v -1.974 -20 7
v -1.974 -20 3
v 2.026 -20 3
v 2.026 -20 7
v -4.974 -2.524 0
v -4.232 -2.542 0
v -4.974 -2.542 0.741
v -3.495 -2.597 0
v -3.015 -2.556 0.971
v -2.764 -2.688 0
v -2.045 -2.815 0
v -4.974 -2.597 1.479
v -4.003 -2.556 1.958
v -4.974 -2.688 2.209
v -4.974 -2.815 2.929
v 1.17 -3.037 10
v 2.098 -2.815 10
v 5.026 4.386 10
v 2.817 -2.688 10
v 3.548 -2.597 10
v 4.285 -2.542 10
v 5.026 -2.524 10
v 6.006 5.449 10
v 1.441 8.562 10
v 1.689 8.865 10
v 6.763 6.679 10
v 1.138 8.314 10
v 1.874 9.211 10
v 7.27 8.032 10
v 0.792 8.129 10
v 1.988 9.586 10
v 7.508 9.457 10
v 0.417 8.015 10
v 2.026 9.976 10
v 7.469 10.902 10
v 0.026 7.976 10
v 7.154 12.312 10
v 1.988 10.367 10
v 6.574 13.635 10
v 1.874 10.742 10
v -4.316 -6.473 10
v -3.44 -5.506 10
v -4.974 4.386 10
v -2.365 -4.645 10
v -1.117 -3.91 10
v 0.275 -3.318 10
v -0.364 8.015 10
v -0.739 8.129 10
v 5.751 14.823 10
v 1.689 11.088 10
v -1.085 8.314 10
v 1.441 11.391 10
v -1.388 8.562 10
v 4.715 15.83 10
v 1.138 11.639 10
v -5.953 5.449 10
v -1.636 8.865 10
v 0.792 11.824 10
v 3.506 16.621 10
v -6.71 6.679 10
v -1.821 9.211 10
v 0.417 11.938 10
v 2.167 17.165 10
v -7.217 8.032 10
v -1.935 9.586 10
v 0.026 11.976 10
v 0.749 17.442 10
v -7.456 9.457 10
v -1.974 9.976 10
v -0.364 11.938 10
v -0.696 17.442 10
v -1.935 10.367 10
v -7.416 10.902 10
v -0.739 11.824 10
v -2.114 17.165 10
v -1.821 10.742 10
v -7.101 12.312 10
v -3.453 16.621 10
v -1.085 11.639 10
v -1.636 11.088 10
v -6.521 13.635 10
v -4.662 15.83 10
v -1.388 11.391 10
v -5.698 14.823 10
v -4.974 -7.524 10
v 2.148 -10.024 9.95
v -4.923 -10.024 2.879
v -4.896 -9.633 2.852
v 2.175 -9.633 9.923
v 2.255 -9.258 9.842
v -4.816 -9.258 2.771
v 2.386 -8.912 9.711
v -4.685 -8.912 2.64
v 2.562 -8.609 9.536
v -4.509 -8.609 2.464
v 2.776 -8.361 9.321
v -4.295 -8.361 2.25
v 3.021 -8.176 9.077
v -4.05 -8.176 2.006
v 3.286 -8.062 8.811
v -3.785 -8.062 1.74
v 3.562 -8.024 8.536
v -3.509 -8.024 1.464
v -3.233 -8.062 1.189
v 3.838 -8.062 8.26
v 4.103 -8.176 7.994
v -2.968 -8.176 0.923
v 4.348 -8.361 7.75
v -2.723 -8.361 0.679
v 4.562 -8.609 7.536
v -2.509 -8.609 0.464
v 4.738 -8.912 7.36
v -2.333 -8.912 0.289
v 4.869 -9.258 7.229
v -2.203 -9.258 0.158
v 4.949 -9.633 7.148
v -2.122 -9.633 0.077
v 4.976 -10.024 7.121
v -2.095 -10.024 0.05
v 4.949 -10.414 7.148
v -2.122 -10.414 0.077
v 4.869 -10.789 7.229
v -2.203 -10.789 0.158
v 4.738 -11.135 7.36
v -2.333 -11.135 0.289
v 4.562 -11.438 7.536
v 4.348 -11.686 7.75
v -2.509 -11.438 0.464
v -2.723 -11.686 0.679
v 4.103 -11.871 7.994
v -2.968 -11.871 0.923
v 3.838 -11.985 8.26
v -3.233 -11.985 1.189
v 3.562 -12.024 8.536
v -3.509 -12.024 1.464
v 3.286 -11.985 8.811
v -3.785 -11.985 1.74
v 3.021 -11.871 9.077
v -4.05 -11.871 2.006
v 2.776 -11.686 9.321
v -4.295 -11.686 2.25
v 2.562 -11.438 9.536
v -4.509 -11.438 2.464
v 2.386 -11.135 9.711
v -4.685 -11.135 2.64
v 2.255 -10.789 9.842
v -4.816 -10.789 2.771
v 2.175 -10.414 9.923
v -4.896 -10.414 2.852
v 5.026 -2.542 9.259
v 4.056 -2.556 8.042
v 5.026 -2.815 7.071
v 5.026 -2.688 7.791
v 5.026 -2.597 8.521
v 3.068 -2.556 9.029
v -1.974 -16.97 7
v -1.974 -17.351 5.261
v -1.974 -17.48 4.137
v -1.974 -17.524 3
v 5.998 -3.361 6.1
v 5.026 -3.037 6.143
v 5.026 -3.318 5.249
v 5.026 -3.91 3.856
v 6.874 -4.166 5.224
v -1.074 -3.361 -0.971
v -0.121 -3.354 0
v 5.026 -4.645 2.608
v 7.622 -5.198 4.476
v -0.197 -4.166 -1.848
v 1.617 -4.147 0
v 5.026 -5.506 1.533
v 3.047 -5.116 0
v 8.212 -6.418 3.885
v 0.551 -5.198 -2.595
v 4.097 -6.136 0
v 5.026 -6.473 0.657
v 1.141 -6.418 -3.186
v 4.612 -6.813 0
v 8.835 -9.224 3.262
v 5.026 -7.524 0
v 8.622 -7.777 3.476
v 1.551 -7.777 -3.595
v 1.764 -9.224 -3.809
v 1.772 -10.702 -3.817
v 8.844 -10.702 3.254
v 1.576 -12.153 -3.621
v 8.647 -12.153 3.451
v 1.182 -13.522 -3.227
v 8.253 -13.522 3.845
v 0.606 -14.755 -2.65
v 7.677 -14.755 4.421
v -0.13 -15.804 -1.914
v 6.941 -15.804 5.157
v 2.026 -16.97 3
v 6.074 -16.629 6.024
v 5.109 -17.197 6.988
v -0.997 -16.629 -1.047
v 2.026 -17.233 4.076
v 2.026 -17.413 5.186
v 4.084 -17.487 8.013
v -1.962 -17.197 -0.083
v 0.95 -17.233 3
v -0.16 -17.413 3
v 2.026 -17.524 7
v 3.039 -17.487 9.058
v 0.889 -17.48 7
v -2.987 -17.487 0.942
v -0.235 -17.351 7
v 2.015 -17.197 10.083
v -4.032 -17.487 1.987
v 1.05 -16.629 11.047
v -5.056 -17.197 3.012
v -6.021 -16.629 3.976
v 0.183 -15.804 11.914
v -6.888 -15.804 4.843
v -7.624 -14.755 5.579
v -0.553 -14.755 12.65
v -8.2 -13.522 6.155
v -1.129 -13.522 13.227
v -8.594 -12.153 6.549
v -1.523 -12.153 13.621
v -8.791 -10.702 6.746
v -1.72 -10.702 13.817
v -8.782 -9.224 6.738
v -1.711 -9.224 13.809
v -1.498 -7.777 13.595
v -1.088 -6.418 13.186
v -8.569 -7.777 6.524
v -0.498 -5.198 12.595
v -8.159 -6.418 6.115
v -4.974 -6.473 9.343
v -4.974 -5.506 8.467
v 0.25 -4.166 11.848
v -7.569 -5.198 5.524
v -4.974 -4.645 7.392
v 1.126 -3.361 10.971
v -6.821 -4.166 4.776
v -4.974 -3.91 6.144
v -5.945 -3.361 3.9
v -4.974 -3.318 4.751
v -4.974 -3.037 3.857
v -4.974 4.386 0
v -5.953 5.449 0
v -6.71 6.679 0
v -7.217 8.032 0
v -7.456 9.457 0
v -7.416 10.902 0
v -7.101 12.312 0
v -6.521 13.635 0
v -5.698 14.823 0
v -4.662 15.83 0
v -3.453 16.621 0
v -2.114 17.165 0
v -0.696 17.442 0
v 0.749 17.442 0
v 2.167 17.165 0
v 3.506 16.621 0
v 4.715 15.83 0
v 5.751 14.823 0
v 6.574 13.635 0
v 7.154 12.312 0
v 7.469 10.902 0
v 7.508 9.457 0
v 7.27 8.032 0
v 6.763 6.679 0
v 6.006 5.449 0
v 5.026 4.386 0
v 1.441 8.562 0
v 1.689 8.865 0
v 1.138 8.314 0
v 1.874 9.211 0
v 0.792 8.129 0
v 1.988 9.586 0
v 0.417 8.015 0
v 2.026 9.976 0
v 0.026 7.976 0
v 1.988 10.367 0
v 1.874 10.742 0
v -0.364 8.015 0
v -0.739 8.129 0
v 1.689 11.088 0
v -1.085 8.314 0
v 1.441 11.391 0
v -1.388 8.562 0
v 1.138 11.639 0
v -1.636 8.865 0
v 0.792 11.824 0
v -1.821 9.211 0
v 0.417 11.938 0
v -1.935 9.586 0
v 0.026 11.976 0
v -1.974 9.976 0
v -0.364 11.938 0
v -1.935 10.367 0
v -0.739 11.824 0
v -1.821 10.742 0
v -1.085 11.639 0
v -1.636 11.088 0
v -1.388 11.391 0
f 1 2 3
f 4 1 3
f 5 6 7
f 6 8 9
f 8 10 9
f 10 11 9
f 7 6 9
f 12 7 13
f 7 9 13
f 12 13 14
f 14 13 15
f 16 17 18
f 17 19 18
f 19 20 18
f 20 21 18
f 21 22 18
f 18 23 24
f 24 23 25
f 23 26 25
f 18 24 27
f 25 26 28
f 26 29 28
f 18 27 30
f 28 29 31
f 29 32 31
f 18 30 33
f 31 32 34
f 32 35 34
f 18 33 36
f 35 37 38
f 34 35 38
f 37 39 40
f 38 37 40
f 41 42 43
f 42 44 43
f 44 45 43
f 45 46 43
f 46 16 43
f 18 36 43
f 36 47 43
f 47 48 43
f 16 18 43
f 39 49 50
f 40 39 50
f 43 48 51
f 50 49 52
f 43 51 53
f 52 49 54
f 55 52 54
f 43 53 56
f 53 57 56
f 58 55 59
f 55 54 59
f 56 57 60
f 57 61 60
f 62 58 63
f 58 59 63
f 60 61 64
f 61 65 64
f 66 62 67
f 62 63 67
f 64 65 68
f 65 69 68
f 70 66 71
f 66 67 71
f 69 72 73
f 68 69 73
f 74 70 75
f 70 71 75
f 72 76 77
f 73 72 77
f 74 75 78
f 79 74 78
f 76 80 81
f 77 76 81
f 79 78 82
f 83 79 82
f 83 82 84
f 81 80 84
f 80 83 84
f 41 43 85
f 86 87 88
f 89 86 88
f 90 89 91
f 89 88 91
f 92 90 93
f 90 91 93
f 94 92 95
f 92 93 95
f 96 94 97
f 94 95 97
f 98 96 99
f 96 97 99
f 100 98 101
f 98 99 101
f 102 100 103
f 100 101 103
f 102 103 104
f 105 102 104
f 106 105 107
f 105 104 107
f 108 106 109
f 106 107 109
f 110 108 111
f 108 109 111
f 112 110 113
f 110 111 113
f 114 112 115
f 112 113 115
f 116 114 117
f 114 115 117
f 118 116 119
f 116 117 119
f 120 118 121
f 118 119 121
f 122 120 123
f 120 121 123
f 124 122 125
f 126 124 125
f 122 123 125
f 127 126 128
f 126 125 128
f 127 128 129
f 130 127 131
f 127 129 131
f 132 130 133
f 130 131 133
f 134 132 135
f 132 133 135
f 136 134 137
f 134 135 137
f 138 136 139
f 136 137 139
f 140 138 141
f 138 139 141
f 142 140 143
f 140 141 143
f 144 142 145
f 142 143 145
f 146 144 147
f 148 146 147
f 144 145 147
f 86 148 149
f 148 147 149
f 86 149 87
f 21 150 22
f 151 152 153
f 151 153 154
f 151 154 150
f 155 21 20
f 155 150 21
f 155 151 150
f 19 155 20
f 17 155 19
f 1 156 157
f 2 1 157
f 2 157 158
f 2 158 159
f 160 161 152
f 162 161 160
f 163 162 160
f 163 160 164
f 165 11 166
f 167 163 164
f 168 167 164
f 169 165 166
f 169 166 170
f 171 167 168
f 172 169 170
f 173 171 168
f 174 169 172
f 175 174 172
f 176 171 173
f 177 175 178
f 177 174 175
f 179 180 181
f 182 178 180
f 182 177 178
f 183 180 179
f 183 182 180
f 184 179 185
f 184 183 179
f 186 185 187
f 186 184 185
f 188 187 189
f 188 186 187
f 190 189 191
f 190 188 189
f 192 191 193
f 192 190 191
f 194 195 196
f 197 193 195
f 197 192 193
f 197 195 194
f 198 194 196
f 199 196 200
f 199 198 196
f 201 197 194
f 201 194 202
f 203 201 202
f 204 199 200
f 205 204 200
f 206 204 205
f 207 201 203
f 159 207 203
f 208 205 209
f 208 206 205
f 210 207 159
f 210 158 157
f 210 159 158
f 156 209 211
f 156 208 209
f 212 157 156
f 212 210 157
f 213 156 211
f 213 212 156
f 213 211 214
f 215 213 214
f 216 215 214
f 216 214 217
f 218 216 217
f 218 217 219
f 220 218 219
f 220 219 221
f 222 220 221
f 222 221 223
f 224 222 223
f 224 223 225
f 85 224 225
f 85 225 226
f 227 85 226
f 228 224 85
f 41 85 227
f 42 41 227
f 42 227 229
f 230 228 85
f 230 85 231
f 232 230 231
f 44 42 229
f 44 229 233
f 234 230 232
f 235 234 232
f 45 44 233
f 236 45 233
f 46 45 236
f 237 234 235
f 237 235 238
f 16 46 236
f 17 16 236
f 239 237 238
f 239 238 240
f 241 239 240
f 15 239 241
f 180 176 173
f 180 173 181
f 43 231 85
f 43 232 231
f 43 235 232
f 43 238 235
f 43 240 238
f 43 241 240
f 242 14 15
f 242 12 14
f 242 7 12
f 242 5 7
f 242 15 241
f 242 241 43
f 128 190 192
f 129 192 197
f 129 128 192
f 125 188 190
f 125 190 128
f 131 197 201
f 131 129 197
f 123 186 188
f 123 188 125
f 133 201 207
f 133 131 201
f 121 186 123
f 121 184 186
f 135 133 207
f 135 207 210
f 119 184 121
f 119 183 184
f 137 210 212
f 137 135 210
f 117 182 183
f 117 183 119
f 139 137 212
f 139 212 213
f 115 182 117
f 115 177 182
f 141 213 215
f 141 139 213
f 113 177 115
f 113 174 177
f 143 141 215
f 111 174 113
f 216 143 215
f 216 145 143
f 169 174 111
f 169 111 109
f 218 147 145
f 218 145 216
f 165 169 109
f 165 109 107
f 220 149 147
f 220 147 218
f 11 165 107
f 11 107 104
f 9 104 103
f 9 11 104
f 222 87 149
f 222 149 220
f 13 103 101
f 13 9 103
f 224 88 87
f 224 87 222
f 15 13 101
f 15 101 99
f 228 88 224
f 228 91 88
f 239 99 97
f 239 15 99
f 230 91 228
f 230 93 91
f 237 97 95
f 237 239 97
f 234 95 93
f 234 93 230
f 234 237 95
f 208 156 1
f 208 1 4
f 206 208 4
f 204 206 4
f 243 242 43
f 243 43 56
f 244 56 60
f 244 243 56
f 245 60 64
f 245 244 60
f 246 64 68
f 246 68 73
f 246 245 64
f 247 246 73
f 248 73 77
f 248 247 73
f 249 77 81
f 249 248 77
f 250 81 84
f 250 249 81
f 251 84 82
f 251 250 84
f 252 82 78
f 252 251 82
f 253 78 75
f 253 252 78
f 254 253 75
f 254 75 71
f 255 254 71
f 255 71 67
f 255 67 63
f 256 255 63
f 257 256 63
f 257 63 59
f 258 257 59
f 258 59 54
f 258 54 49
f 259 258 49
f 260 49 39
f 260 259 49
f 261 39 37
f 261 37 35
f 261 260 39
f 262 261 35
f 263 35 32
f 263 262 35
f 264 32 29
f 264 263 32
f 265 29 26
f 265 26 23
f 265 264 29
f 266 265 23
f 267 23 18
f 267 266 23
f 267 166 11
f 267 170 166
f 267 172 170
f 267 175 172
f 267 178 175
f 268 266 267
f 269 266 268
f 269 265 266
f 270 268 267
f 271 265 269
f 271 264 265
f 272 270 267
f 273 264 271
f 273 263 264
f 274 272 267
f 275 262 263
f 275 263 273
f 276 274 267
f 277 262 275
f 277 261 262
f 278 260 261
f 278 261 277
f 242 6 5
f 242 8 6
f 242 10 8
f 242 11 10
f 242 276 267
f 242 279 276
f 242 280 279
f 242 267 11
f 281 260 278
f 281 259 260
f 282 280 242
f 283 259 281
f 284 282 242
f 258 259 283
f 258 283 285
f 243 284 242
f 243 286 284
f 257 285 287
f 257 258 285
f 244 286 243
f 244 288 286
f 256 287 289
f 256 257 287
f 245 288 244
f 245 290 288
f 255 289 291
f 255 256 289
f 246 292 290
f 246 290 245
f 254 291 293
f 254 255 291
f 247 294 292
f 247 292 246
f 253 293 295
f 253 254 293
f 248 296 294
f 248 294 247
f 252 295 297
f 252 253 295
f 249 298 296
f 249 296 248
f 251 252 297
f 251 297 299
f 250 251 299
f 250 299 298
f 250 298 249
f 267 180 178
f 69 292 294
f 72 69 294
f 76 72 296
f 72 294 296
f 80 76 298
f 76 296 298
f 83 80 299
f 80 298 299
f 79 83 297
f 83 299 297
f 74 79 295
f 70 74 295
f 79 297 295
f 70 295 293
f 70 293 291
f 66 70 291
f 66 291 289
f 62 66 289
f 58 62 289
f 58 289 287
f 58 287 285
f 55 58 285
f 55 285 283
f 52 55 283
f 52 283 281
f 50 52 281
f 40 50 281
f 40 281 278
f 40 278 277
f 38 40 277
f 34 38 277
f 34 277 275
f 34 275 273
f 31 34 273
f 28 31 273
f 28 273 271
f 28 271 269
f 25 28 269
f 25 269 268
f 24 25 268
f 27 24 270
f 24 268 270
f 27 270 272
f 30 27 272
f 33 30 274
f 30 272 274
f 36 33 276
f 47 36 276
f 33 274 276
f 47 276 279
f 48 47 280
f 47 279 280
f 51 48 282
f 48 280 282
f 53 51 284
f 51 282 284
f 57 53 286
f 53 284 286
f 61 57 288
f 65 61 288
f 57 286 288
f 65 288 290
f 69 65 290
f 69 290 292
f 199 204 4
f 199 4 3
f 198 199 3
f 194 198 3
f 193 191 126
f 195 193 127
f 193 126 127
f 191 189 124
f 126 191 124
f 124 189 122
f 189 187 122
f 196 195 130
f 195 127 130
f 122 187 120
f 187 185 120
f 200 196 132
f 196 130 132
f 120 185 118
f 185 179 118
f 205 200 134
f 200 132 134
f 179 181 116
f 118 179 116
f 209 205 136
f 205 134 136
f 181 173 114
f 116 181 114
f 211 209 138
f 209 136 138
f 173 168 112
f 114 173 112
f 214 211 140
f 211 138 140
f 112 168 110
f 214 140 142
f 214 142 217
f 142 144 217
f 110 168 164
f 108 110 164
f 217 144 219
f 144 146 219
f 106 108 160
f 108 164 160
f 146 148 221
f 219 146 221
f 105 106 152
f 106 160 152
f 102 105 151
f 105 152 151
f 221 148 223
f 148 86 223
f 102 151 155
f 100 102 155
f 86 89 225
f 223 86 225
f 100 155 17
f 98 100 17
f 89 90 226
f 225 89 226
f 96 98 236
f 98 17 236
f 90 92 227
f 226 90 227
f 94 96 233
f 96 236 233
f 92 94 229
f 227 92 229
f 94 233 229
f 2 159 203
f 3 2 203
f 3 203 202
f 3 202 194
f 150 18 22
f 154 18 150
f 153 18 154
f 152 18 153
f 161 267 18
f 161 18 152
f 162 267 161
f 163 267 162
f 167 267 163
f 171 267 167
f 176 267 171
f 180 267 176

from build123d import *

# Parameters (mm, degrees)
SKETCH1_R               = 1.5
BOSS_EXTRUDE1_DEPTH     = 10
SKETCH2_R               = 2
CUT_EXTRUDE1_DEPTH      = 30
SKETCH6_R               = 7.5
BOSS_EXTRUDE3_DEPTH     = 5
CUT_EXTRUDE4_DEPTH      = 26.013853674
CUT_EXTRUDE4_DEPTH_BACK = 26.013853674
SKETCH7_R               = 1.5
SKETCH8_R               = 2
CUT_EXTRUDE5_DEPTH      = 18
SKETCH10_R              = 7.5
CUT_EXTRUDE7_DEPTH      = 9
SKETCH11_W              = 4
SKETCH11_H              = 4
BOSS_EXTRUDE4_DEPTH     = 2.5


with BuildPart() as part:
    # Sketch1 → Boss-Extrude1 (new body)
    with BuildSketch(Plane.XY):
        with BuildLine():
            Line((5.026455026, -10.023549892), (-4.973544974, -10.023549892))
            Line((-4.973544974, -10.023549892), (-4.973544974, 4.386280164))
            ThreePointArc((-4.973544974, 4.386280164), (0.026455026, 17.476450108), (5.026455026, 4.386280164))
            Line((5.026455026, 4.386280164), (5.026455026, -10.023549892))
        make_face()
        with Locations((0.026455026, 9.976450108)):
            Circle(SKETCH1_R, mode=Mode.SUBTRACT)
    extrude(amount=BOSS_EXTRUDE1_DEPTH)

    # Sketch2 → Cut-Extrude1 (cut)
    with BuildSketch(Plane(origin=(0, 0, 0), x_dir=(-1, 0, 0), z_dir=(0, 0, -1))):
        with Locations((-0.026455026, 9.976450108)):
            Circle(SKETCH2_R)
    extrude(amount=-CUT_EXTRUDE1_DEPTH, mode=Mode.SUBTRACT)

    # Sketch6 → Boss-Extrude3 (add, symmetric)
    with BuildSketch(Plane(origin=(2.513227513, 0, 2.513227513), x_dir=(-0.7071067811865477, 0, 0.7071067811865475), z_dir=(-0.7071067811865475, 0, -0.7071067811865477))):
        with Locations((3.516827377, -10.023549892)):
            Circle(SKETCH6_R)
    extrude(amount=BOSS_EXTRUDE3_DEPTH, both=True)

    # Sketch7 → Cut-Extrude4 (cut, two sides: drawn at the far end of the back side and taken through both)
    with BuildSketch(Plane(origin=(-1.022306393, 0, -1.022306393), x_dir=(-0.7071067811865476, 0, 0.7071067811865476), z_dir=(-0.7071067811865476, 0, -0.7071067811865476)).offset(-CUT_EXTRUDE4_DEPTH_BACK)):
        with Locations((3.516827377, -10.023549892)):
            Circle(SKETCH7_R)
    extrude(amount=CUT_EXTRUDE4_DEPTH + CUT_EXTRUDE4_DEPTH_BACK, mode=Mode.SUBTRACT)

    # Sketch8 → Cut-Extrude5 (cut, symmetric)
    with BuildSketch(Plane(origin=(-1.022306393, 0, -1.022306393), x_dir=(-0.7071067811865476, 0, 0.7071067811865476), z_dir=(-0.7071067811865476, 0, -0.7071067811865476))):
        with Locations((3.516827377, -10.023549892)):
            Circle(SKETCH8_R)
    extrude(amount=CUT_EXTRUDE5_DEPTH, both=True, mode=Mode.SUBTRACT)

    # Sketch10 → Cut-Extrude7 (cut)
    with BuildSketch(Plane(origin=(6.048761419, 0, 6.048761419), x_dir=(0.7071067811865476, 0, -0.7071067811865476), z_dir=(0.7071067811865476, 0, 0.7071067811865476))):
        with Locations((-3.516827377, -10.023549892)):
            Circle(SKETCH10_R)
    cut_extrude7 = extrude(amount=CUT_EXTRUDE7_DEPTH, mode=Mode.SUBTRACT)

    # Mirror1: Cut-Extrude7 across plane
    add(cut_extrude7.mirror(Plane(origin=(2.513227513, 0, 2.513227513), x_dir=(-0.7071067811865478, 0, 0.7071067811865472), z_dir=(-0.7071067811865475, 0, -0.7071067811865477))), mode=Mode.SUBTRACT)

    # Sketch11 → Boss-Extrude4 (add, symmetric)
    with BuildSketch(Plane(origin=(0, -17.5, 0), x_dir=(1, 0, 0), z_dir=(0, 1, 0))):
        with Locations((0.026455026, -5)):
            Rectangle(SKETCH11_W, SKETCH11_H)
    extrude(amount=BOSS_EXTRUDE4_DEPTH, both=True)


solid = part.part
